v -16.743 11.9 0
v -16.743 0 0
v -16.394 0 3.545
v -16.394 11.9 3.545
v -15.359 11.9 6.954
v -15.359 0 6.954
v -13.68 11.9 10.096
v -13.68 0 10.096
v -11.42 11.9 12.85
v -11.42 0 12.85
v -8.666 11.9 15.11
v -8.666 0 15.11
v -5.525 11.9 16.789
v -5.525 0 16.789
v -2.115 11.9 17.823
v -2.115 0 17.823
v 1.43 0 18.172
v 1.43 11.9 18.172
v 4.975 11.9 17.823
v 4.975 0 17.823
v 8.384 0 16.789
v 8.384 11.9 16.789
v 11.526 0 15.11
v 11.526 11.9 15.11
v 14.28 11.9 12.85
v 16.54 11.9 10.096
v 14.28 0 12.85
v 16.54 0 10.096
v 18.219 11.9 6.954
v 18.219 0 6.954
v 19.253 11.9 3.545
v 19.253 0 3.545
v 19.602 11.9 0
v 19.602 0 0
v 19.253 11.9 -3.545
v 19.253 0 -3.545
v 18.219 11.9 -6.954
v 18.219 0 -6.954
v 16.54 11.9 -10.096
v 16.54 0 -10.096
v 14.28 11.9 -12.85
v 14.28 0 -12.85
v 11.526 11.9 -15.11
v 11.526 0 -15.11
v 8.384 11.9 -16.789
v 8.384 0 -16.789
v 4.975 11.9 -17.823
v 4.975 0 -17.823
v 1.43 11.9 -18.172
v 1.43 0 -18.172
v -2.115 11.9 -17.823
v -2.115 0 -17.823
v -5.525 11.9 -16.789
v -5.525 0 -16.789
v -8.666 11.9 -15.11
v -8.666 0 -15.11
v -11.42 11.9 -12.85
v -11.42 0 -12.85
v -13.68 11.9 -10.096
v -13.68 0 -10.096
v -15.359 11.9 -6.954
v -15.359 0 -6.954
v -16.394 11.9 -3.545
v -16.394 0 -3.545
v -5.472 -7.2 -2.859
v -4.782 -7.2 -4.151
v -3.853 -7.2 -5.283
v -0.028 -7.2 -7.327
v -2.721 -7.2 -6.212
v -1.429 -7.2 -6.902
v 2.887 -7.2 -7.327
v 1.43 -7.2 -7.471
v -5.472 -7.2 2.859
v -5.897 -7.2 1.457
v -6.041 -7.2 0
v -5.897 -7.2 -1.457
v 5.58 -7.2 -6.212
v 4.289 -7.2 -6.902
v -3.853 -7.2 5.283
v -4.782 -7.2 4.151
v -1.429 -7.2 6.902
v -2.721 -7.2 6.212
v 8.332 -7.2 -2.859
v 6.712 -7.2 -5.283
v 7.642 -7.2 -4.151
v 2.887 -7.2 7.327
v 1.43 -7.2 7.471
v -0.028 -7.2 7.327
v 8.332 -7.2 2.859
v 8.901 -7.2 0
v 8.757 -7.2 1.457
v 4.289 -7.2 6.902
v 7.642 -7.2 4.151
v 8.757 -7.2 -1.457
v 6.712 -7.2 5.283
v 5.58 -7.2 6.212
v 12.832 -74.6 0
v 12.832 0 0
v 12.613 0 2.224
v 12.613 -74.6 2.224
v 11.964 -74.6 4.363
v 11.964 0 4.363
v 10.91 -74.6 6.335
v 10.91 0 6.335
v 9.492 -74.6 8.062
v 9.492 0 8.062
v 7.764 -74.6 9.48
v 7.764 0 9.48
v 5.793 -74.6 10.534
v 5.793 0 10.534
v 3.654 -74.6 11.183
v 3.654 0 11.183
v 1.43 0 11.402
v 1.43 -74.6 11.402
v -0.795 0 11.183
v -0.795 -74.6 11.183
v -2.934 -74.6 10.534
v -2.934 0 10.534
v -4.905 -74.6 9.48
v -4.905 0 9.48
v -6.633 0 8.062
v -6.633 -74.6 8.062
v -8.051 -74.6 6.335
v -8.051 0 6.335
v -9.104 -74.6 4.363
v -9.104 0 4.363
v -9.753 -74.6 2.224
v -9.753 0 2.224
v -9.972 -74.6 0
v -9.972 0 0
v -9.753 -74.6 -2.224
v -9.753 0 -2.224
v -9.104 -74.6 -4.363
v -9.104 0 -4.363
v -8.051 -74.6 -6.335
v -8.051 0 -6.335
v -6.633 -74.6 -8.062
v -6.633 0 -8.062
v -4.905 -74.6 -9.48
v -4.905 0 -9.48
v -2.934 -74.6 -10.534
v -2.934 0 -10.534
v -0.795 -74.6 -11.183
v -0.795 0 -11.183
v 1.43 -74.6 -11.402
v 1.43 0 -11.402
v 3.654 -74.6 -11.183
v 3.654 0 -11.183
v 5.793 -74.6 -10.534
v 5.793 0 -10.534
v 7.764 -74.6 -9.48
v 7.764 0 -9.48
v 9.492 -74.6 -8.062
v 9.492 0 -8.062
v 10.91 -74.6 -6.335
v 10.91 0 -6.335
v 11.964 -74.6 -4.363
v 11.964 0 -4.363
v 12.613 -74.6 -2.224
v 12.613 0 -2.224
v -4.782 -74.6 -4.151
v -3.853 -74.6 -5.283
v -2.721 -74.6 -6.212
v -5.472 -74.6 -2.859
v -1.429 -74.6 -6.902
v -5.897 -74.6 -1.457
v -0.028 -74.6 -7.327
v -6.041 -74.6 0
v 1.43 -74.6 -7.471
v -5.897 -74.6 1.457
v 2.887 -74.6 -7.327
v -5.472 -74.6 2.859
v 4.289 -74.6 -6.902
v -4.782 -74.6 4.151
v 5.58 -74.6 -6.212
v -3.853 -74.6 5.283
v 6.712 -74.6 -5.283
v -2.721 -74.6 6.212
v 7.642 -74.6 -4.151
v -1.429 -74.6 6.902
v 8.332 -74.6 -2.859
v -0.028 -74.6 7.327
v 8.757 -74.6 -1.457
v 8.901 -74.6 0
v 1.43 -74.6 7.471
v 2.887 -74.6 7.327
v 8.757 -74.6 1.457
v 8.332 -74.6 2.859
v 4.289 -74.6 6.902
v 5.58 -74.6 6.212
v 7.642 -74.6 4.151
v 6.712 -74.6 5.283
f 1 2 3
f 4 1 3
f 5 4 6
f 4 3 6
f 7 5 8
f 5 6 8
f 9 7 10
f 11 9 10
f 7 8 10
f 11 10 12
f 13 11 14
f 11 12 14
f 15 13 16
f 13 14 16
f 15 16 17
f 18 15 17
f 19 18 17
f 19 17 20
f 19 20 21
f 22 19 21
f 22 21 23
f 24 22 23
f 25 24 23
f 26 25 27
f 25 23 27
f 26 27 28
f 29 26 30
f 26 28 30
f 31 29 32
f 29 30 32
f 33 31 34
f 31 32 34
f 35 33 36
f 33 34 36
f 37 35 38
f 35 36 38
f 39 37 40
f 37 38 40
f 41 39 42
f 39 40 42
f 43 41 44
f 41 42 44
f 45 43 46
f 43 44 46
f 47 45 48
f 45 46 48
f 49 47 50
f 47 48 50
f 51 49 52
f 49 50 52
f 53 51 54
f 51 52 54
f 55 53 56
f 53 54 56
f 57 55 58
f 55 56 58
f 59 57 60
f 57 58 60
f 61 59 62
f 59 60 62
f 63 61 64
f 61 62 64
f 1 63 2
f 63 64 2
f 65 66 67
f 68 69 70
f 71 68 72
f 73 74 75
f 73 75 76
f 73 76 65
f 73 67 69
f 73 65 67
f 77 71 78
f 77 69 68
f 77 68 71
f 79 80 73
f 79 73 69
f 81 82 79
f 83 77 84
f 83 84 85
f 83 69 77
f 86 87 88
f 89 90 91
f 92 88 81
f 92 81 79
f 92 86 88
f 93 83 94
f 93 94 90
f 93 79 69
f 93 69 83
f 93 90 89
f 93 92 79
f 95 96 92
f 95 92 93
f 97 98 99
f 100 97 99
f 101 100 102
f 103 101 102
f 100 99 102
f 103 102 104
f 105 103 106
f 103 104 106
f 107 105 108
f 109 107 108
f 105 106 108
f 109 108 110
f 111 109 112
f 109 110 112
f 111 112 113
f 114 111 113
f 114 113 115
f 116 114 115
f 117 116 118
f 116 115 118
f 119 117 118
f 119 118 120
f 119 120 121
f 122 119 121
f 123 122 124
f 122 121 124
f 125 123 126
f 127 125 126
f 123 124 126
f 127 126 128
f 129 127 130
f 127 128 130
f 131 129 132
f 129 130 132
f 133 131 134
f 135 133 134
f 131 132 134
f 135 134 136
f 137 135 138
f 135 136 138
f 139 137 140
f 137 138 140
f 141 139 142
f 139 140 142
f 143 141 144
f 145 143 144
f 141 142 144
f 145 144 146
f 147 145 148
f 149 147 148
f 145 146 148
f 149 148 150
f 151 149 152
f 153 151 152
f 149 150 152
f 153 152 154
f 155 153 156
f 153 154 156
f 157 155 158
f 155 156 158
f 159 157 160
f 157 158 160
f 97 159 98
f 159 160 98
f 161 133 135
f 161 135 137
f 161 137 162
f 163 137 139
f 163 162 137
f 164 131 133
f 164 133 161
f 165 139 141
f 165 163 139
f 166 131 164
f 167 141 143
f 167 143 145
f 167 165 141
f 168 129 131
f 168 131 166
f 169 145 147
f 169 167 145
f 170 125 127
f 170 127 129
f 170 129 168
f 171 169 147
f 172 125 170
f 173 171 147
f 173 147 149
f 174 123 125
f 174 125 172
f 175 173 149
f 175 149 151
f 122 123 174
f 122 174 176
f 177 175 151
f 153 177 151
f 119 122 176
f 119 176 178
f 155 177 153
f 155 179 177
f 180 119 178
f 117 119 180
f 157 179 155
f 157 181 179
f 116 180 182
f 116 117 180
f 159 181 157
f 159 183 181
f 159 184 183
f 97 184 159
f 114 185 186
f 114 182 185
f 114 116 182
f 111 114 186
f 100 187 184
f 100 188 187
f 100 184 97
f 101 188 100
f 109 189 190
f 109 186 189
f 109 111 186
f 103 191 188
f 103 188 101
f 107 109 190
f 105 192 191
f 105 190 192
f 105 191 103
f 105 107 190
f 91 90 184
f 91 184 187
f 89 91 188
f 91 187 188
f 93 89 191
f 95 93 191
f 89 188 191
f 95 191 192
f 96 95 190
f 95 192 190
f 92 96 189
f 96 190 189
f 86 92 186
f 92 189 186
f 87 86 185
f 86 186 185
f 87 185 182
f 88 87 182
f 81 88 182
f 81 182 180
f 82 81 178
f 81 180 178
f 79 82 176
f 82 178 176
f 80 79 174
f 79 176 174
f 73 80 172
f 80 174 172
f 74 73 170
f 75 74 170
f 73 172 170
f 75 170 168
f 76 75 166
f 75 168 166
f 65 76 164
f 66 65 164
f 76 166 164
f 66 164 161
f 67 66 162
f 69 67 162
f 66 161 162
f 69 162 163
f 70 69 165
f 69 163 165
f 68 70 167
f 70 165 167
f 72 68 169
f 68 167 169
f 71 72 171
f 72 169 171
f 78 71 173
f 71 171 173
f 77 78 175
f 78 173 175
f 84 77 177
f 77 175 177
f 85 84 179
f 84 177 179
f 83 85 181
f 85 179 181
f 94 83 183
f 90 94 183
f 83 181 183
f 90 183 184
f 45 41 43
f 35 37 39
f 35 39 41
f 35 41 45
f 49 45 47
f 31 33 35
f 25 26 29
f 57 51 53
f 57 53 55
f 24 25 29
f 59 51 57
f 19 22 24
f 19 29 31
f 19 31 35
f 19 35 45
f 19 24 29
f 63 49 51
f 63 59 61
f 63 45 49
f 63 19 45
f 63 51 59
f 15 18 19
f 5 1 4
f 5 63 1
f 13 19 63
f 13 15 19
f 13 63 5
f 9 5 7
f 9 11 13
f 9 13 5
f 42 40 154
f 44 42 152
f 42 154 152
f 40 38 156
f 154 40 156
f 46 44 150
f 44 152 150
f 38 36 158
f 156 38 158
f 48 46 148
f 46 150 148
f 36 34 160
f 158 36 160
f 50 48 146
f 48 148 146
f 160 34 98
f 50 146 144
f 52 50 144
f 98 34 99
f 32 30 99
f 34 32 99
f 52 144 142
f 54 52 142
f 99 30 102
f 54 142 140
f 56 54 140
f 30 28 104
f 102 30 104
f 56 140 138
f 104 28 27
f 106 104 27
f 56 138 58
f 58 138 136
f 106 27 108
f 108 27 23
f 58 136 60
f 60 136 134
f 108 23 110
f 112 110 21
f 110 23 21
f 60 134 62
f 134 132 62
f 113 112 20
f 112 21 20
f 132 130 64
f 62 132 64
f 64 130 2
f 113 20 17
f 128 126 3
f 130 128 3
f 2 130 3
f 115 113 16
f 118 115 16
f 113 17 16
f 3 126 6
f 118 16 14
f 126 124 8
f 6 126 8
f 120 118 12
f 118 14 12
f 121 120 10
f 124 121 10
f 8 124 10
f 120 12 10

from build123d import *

# Parameters (mm, degrees)
F0_R     = 11.402
F1_DEPTH = 74.6
F2_R     = 18.172457
F3_DEPTH = 11.9
F4_R     = 7.470799
F5_DEPTH = 67.4


with BuildPart() as f1:
    # F0 (on Front) → F1 (new body)
    with BuildSketch(Plane.XZ):
        with Locations((1.429774, 0)):
            Circle(F0_R)
    extrude(amount=F1_DEPTH)

    # F2 (on face) → F3 (join)
    with BuildSketch(Plane(origin=(0, 0, 0), x_dir=(-1, 0, 0), z_dir=(0, 1, 0))):
        with Locations((-1.429774, 0)):
            Circle(F2_R)
    extrude(amount=F3_DEPTH)

    # F4 (on face) → F5 (cut)
    with BuildSketch(Plane.XZ.offset(74.6)):
        with Locations((1.429774, 0)):
            Circle(F4_R)
    extrude(amount=-F5_DEPTH, mode=Mode.SUBTRACT)


solid = f1.part
